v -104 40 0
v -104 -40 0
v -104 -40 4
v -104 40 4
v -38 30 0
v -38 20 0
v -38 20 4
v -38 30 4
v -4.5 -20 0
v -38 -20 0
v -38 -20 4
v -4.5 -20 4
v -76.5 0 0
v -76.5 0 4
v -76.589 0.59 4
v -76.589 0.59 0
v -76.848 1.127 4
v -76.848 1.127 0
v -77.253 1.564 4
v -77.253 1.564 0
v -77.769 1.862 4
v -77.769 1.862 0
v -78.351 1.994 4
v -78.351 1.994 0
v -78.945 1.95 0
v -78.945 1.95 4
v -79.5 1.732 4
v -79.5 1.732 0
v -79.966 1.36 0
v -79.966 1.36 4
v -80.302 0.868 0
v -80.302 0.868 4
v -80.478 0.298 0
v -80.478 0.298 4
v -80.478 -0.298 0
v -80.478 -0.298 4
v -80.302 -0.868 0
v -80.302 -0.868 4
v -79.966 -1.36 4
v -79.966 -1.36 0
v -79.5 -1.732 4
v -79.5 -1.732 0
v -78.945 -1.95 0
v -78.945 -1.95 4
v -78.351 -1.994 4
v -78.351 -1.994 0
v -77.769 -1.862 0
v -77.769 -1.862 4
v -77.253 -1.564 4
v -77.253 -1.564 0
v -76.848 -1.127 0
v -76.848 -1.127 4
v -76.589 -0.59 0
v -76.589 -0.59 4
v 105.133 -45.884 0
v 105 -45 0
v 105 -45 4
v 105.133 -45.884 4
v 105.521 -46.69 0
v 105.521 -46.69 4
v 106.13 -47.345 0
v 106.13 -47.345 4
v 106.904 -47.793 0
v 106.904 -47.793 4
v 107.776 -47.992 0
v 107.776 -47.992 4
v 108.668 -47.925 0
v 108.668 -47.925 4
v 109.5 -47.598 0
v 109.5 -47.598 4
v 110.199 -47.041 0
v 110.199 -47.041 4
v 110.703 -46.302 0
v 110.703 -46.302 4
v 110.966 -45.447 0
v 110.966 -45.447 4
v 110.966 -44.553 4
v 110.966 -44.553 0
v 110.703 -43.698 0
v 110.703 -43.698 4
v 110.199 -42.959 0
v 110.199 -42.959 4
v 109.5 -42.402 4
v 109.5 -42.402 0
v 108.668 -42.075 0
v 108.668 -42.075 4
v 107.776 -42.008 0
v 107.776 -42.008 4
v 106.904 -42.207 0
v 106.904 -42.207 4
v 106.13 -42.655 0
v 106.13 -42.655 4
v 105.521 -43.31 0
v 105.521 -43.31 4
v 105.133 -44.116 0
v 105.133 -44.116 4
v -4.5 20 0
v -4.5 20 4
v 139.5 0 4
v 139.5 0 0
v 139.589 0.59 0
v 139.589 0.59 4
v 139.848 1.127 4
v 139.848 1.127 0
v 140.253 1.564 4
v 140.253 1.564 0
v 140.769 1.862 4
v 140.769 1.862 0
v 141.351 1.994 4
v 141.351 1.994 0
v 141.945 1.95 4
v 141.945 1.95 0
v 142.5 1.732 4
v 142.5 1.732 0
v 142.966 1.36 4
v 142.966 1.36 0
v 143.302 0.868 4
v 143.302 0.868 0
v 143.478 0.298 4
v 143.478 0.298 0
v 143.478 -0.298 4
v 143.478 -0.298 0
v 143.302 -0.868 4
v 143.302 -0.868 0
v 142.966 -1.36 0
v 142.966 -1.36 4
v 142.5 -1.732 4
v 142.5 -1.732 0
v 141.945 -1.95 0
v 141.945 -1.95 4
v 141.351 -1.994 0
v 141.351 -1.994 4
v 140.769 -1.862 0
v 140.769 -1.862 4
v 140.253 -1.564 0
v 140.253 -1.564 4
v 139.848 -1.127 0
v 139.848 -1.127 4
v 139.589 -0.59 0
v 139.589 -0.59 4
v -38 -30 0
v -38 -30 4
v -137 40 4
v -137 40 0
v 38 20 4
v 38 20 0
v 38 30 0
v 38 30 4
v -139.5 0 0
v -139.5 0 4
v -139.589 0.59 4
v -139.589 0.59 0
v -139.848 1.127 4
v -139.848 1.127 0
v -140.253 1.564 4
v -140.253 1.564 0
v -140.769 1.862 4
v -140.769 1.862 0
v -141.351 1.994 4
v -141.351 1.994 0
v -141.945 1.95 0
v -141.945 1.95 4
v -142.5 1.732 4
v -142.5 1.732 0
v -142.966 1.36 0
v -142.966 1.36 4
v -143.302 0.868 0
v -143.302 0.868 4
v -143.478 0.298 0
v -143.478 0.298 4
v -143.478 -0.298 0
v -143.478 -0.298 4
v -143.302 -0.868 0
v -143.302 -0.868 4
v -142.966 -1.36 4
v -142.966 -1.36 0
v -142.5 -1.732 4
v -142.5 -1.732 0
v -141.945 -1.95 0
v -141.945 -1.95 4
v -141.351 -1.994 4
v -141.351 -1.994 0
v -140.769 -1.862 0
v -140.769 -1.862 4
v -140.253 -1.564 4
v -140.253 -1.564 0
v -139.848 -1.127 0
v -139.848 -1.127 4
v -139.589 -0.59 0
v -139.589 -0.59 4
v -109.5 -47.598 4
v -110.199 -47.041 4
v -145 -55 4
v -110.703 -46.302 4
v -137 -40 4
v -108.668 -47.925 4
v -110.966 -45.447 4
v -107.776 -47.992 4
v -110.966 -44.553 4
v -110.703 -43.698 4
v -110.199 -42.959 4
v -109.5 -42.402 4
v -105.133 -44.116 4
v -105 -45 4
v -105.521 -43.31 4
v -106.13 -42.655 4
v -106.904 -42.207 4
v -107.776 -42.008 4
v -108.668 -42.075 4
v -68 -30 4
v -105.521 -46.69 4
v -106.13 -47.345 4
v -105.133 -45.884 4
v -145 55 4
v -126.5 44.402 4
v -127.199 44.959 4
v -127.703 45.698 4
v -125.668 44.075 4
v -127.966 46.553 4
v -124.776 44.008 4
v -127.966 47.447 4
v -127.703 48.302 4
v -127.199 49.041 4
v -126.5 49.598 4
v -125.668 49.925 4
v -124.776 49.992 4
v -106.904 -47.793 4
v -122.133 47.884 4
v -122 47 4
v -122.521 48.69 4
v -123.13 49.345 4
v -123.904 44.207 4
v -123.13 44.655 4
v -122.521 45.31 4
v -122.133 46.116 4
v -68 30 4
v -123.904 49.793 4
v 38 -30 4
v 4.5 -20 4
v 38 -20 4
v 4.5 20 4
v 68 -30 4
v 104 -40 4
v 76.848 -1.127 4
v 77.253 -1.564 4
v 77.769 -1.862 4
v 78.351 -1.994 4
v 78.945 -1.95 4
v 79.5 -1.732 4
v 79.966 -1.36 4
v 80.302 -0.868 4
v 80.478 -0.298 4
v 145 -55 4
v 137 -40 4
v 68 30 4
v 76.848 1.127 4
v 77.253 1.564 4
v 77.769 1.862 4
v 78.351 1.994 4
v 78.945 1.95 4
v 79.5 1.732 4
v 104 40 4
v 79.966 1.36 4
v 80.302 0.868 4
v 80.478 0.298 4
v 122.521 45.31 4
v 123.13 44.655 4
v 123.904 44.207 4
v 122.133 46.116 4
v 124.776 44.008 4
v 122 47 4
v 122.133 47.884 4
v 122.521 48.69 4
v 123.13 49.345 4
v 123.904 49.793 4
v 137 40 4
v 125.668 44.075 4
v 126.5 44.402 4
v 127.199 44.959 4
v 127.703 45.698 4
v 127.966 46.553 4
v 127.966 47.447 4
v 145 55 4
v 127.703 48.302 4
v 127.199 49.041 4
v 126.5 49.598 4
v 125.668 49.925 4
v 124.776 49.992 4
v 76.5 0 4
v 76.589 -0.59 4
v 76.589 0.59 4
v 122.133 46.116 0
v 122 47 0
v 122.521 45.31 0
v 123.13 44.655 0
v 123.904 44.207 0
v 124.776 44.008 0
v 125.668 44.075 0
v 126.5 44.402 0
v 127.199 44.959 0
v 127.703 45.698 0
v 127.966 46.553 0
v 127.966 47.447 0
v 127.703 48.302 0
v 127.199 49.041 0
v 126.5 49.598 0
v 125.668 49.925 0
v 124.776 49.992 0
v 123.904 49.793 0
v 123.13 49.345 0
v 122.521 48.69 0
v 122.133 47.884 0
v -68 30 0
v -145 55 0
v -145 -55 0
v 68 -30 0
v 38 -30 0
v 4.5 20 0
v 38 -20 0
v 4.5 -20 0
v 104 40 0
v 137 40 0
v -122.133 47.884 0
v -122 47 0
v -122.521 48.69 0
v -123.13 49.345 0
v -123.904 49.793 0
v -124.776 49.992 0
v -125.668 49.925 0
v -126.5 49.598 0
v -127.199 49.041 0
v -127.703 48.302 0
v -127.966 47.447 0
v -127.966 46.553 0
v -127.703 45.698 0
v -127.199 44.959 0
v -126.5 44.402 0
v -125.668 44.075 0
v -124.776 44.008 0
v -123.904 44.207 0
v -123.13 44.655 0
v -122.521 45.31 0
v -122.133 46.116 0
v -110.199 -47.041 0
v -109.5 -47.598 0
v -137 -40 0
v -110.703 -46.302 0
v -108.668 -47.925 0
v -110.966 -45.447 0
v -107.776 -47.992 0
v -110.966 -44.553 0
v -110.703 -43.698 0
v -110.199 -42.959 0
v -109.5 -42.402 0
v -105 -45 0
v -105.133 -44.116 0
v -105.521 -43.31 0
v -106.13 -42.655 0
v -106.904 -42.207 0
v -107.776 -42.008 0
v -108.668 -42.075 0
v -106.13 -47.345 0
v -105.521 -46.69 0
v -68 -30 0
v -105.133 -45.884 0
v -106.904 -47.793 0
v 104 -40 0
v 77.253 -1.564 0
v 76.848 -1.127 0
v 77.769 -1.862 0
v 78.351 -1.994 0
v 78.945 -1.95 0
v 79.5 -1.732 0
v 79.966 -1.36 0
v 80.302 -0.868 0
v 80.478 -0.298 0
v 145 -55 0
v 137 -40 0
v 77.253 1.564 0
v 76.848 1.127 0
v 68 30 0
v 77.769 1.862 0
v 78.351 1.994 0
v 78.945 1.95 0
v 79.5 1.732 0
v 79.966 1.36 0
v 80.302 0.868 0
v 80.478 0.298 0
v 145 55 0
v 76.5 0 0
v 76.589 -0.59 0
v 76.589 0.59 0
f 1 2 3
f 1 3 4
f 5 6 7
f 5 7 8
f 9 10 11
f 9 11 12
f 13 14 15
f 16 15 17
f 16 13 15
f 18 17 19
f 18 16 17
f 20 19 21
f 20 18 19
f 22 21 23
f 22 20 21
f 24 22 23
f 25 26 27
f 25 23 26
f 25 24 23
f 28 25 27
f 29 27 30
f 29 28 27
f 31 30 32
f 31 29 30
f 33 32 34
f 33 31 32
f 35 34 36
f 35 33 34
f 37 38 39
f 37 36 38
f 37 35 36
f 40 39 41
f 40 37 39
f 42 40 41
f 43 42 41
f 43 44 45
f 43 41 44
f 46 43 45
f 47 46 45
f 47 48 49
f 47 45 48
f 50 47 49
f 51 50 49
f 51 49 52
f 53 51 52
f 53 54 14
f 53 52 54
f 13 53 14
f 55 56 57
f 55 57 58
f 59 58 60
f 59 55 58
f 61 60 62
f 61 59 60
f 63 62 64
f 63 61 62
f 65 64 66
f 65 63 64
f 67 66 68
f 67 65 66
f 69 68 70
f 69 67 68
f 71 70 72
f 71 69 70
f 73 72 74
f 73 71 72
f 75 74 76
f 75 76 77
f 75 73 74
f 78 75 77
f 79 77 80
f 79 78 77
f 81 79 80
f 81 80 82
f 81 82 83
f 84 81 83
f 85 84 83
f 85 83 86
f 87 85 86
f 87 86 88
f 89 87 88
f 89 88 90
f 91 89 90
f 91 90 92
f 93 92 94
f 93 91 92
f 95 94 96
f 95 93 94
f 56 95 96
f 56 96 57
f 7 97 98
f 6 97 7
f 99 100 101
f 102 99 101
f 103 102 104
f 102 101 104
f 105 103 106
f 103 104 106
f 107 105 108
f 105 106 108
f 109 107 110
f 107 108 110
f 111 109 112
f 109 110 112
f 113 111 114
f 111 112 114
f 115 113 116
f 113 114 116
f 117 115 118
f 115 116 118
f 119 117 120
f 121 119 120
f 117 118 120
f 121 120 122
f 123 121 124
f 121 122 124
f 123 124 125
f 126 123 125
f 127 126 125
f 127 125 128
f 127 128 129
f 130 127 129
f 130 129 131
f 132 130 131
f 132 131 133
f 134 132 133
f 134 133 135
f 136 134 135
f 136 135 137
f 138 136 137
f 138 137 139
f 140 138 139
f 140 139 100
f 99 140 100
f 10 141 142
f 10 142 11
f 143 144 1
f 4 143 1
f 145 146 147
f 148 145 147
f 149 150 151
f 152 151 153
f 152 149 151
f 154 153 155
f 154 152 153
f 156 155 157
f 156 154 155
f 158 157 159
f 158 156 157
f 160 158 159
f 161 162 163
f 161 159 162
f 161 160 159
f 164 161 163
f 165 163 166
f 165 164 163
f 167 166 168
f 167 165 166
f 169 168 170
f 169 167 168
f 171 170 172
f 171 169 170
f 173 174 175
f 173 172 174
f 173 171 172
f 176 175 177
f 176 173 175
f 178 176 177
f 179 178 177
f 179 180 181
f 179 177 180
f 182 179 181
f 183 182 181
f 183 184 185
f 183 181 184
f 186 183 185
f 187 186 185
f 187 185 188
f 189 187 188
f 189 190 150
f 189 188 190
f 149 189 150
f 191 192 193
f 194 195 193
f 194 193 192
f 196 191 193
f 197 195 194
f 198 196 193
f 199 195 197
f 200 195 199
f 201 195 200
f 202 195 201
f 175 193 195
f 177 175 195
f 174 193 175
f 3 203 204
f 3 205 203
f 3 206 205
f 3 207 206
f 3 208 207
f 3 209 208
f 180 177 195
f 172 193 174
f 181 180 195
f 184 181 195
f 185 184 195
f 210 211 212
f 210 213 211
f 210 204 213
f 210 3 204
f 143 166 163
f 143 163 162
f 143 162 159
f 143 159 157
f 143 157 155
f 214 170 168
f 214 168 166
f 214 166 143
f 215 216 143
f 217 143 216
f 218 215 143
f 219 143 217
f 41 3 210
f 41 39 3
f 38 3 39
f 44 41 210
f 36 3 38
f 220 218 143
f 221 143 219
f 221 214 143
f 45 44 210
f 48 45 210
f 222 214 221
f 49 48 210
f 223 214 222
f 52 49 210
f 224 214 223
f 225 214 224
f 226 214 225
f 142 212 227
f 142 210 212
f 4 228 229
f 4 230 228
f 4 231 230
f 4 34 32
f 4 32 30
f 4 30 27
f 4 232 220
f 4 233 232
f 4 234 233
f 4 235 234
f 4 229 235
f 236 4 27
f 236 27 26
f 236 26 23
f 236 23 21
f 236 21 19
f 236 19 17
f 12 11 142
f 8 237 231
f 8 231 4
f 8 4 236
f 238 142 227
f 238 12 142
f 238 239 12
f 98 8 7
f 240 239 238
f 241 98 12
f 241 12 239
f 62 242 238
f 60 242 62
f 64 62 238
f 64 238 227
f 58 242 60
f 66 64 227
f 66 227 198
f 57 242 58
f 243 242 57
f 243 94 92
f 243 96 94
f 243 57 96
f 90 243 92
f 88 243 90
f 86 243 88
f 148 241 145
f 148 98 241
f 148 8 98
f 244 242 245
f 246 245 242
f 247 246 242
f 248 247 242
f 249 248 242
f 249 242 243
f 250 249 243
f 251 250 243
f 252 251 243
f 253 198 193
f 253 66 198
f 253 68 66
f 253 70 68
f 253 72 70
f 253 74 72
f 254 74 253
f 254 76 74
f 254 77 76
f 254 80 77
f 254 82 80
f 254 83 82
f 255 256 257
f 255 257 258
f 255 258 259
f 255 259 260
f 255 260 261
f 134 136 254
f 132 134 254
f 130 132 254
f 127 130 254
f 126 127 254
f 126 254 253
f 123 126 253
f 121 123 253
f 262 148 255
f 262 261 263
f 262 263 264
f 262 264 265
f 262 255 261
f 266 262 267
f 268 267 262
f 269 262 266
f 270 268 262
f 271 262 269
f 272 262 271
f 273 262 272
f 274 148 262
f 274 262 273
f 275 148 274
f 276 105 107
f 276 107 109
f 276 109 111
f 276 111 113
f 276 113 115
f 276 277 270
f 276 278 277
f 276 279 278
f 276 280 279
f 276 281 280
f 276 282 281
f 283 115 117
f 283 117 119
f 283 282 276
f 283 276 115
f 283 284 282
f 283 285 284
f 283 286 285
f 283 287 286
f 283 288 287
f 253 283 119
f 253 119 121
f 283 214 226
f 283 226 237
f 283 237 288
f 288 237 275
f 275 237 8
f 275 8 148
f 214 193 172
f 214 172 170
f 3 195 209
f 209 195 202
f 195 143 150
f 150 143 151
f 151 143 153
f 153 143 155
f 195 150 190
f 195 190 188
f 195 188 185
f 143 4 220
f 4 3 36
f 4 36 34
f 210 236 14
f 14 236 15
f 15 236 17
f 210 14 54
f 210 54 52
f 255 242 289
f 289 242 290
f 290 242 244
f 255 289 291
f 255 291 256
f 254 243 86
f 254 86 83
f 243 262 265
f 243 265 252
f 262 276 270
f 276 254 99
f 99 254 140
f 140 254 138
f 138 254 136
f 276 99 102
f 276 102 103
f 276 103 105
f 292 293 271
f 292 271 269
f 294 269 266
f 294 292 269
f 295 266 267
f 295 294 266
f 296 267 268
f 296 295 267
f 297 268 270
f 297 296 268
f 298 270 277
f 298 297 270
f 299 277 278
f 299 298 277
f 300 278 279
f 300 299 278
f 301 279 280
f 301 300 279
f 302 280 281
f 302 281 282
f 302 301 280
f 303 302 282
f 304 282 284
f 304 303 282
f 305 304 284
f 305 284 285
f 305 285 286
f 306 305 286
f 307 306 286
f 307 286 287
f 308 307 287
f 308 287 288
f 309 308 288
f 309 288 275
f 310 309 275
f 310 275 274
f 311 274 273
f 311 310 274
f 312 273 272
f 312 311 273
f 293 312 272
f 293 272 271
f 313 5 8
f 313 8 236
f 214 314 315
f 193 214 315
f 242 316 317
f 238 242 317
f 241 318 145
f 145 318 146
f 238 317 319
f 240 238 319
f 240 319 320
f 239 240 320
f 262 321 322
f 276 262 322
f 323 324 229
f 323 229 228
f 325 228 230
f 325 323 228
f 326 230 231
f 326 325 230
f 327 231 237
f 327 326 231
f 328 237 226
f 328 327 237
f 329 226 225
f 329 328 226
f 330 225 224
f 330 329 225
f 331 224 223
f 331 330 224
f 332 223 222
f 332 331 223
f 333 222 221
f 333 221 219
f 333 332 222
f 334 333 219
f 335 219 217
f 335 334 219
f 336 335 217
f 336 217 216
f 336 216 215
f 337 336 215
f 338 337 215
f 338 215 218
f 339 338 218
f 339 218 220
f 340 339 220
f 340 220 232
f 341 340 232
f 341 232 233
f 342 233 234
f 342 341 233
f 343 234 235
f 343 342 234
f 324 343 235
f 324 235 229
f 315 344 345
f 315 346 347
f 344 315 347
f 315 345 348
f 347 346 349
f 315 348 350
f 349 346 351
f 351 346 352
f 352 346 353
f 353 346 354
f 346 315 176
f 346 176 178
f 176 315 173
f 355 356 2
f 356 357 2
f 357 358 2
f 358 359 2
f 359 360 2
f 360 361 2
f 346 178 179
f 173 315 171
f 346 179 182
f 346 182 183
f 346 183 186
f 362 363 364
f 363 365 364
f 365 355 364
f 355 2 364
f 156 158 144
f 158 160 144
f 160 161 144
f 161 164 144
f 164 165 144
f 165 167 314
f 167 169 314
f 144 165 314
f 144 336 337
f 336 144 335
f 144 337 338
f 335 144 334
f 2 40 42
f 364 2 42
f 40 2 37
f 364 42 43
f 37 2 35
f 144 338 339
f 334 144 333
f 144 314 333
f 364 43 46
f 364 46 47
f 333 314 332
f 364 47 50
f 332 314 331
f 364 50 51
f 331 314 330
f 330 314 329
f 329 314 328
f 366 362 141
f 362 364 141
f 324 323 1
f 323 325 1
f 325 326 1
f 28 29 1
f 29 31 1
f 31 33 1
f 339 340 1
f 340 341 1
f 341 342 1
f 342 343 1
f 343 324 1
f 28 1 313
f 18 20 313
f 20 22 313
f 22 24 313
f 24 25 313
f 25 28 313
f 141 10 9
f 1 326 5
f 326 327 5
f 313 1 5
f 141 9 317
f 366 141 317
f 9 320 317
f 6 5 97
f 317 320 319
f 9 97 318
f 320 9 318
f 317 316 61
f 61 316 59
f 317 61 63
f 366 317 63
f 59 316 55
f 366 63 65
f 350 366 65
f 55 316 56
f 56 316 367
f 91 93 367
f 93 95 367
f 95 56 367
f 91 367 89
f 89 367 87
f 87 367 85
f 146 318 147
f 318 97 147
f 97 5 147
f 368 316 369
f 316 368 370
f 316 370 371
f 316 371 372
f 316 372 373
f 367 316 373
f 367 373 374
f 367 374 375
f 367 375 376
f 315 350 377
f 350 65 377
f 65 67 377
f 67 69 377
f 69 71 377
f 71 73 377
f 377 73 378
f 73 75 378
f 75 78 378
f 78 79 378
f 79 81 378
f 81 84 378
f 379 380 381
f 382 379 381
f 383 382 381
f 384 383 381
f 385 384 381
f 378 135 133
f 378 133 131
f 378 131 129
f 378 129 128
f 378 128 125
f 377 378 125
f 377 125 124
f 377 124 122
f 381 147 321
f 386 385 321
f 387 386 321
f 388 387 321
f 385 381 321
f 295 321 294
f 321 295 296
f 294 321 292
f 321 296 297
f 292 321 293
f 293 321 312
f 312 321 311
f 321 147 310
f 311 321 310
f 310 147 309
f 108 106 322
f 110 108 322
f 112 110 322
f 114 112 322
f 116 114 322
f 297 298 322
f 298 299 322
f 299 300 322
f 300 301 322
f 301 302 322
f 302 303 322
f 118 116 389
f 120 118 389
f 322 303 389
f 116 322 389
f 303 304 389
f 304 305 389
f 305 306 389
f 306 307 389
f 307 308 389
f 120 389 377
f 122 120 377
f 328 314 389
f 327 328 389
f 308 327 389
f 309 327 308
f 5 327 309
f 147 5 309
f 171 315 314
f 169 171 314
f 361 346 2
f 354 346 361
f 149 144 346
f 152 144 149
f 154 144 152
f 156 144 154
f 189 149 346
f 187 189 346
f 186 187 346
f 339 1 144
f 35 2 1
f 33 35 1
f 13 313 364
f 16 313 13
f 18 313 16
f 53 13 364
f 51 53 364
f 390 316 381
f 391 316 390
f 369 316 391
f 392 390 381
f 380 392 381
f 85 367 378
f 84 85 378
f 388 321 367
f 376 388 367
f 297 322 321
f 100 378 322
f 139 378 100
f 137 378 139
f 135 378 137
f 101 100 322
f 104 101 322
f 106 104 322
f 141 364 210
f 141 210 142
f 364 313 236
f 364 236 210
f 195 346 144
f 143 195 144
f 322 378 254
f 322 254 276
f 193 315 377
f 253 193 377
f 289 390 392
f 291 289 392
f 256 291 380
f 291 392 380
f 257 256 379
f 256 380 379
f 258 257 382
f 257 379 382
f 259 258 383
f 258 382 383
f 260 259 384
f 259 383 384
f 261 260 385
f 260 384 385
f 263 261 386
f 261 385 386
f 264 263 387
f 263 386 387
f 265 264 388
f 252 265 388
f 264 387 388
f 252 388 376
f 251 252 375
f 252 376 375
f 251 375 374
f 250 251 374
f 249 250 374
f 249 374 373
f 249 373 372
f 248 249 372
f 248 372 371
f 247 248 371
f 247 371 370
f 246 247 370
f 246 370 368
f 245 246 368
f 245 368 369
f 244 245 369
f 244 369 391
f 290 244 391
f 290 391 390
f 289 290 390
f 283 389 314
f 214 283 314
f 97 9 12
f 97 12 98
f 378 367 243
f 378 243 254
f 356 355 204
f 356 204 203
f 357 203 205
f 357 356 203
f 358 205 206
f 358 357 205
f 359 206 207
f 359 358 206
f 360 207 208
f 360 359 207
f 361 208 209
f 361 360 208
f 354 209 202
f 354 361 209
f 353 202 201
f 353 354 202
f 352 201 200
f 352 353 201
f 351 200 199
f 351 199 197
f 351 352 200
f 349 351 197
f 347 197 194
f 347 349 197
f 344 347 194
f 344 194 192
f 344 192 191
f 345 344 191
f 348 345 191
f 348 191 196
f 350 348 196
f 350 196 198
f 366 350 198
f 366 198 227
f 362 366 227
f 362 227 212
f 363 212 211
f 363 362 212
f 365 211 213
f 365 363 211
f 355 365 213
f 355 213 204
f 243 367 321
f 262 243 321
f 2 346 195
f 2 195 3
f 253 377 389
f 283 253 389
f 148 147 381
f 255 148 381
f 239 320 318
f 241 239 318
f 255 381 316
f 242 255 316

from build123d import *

# Parameters (mm, degrees)
SKETCH1_R           = 3
SKETCH1_W           = 33
SKETCH1_H           = 80
BOSS_EXTRUDE1_DEPTH = 4
SKETCH4_R           = 2
CUT_EXTRUDE2_DEPTH  = 10
SKETCH5_R           = 2
CUT_EXTRUDE3_DEPTH  = 10


with BuildPart() as part:
    # Sketch1 → Boss-Extrude1 (new body)
    with BuildSketch(Plane.XY):
        Polygon((-145, -20.635083269), (-145, -55), (145, -55), (145, -20.635083269), (145, 40), (145, 55), (-145, 55), (-145, 40), align=None)
        with Locations((-108, -45)):
            Circle(SKETCH1_R, mode=Mode.SUBTRACT)
        with Locations((-125, 47)):
            Circle(SKETCH1_R, mode=Mode.SUBTRACT)
        with Locations(Location((125, 47, 0), (0, 0, 180))):
            Circle(SKETCH1_R, mode=Mode.SUBTRACT)
        with Locations(Location((108, -45, 0), (0, 0, 180))):
            Circle(SKETCH1_R, mode=Mode.SUBTRACT)
        with Locations((-120.5, 0)):
            Rectangle(SKETCH1_W, SKETCH1_H, mode=Mode.SUBTRACT)
        Polygon((-68, -30), (-38, -30), (-38, -20), (-4.5, -20), (-4.5, 20), (-38, 20), (-38, 30), (-68, 30), align=None, mode=Mode.SUBTRACT)
        Polygon((38, 20), (38, 30), (68, 30), (68, -30), (38, -30), (38, -20), (4.5, -20), (4.5, 20), align=None, mode=Mode.SUBTRACT)
        with Locations((120.5, 0)):
            Rectangle(SKETCH1_W, SKETCH1_H, mode=Mode.SUBTRACT)
    extrude(amount=BOSS_EXTRUDE1_DEPTH)

    # Sketch4 → Cut-Extrude2 (cut)
    with BuildSketch(Plane(origin=(0, 0, 0), x_dir=(-1, 0, 0), z_dir=(0, 0, -1))):
        with Locations((-141.5, 0)):
            Circle(SKETCH4_R)
    cut_extrude2 = extrude(amount=-CUT_EXTRUDE2_DEPTH, mode=Mode.SUBTRACT)

    # Sketch5 → Cut-Extrude3 (cut)
    with BuildSketch(Plane(origin=(0, 0, 0), x_dir=(-1, 0, 0), z_dir=(0, 0, -1))):
        with Locations((-78.5, 0)):
            Circle(SKETCH5_R)
    cut_extrude3 = extrude(amount=-CUT_EXTRUDE3_DEPTH, mode=Mode.SUBTRACT)

    # Mirror1: Cut-Extrude2, Cut-Extrude3 across plane
    add(cut_extrude2.mirror(Plane.ZY), mode=Mode.SUBTRACT)
    add(cut_extrude3.mirror(Plane.ZY), mode=Mode.SUBTRACT)


solid = part.part
